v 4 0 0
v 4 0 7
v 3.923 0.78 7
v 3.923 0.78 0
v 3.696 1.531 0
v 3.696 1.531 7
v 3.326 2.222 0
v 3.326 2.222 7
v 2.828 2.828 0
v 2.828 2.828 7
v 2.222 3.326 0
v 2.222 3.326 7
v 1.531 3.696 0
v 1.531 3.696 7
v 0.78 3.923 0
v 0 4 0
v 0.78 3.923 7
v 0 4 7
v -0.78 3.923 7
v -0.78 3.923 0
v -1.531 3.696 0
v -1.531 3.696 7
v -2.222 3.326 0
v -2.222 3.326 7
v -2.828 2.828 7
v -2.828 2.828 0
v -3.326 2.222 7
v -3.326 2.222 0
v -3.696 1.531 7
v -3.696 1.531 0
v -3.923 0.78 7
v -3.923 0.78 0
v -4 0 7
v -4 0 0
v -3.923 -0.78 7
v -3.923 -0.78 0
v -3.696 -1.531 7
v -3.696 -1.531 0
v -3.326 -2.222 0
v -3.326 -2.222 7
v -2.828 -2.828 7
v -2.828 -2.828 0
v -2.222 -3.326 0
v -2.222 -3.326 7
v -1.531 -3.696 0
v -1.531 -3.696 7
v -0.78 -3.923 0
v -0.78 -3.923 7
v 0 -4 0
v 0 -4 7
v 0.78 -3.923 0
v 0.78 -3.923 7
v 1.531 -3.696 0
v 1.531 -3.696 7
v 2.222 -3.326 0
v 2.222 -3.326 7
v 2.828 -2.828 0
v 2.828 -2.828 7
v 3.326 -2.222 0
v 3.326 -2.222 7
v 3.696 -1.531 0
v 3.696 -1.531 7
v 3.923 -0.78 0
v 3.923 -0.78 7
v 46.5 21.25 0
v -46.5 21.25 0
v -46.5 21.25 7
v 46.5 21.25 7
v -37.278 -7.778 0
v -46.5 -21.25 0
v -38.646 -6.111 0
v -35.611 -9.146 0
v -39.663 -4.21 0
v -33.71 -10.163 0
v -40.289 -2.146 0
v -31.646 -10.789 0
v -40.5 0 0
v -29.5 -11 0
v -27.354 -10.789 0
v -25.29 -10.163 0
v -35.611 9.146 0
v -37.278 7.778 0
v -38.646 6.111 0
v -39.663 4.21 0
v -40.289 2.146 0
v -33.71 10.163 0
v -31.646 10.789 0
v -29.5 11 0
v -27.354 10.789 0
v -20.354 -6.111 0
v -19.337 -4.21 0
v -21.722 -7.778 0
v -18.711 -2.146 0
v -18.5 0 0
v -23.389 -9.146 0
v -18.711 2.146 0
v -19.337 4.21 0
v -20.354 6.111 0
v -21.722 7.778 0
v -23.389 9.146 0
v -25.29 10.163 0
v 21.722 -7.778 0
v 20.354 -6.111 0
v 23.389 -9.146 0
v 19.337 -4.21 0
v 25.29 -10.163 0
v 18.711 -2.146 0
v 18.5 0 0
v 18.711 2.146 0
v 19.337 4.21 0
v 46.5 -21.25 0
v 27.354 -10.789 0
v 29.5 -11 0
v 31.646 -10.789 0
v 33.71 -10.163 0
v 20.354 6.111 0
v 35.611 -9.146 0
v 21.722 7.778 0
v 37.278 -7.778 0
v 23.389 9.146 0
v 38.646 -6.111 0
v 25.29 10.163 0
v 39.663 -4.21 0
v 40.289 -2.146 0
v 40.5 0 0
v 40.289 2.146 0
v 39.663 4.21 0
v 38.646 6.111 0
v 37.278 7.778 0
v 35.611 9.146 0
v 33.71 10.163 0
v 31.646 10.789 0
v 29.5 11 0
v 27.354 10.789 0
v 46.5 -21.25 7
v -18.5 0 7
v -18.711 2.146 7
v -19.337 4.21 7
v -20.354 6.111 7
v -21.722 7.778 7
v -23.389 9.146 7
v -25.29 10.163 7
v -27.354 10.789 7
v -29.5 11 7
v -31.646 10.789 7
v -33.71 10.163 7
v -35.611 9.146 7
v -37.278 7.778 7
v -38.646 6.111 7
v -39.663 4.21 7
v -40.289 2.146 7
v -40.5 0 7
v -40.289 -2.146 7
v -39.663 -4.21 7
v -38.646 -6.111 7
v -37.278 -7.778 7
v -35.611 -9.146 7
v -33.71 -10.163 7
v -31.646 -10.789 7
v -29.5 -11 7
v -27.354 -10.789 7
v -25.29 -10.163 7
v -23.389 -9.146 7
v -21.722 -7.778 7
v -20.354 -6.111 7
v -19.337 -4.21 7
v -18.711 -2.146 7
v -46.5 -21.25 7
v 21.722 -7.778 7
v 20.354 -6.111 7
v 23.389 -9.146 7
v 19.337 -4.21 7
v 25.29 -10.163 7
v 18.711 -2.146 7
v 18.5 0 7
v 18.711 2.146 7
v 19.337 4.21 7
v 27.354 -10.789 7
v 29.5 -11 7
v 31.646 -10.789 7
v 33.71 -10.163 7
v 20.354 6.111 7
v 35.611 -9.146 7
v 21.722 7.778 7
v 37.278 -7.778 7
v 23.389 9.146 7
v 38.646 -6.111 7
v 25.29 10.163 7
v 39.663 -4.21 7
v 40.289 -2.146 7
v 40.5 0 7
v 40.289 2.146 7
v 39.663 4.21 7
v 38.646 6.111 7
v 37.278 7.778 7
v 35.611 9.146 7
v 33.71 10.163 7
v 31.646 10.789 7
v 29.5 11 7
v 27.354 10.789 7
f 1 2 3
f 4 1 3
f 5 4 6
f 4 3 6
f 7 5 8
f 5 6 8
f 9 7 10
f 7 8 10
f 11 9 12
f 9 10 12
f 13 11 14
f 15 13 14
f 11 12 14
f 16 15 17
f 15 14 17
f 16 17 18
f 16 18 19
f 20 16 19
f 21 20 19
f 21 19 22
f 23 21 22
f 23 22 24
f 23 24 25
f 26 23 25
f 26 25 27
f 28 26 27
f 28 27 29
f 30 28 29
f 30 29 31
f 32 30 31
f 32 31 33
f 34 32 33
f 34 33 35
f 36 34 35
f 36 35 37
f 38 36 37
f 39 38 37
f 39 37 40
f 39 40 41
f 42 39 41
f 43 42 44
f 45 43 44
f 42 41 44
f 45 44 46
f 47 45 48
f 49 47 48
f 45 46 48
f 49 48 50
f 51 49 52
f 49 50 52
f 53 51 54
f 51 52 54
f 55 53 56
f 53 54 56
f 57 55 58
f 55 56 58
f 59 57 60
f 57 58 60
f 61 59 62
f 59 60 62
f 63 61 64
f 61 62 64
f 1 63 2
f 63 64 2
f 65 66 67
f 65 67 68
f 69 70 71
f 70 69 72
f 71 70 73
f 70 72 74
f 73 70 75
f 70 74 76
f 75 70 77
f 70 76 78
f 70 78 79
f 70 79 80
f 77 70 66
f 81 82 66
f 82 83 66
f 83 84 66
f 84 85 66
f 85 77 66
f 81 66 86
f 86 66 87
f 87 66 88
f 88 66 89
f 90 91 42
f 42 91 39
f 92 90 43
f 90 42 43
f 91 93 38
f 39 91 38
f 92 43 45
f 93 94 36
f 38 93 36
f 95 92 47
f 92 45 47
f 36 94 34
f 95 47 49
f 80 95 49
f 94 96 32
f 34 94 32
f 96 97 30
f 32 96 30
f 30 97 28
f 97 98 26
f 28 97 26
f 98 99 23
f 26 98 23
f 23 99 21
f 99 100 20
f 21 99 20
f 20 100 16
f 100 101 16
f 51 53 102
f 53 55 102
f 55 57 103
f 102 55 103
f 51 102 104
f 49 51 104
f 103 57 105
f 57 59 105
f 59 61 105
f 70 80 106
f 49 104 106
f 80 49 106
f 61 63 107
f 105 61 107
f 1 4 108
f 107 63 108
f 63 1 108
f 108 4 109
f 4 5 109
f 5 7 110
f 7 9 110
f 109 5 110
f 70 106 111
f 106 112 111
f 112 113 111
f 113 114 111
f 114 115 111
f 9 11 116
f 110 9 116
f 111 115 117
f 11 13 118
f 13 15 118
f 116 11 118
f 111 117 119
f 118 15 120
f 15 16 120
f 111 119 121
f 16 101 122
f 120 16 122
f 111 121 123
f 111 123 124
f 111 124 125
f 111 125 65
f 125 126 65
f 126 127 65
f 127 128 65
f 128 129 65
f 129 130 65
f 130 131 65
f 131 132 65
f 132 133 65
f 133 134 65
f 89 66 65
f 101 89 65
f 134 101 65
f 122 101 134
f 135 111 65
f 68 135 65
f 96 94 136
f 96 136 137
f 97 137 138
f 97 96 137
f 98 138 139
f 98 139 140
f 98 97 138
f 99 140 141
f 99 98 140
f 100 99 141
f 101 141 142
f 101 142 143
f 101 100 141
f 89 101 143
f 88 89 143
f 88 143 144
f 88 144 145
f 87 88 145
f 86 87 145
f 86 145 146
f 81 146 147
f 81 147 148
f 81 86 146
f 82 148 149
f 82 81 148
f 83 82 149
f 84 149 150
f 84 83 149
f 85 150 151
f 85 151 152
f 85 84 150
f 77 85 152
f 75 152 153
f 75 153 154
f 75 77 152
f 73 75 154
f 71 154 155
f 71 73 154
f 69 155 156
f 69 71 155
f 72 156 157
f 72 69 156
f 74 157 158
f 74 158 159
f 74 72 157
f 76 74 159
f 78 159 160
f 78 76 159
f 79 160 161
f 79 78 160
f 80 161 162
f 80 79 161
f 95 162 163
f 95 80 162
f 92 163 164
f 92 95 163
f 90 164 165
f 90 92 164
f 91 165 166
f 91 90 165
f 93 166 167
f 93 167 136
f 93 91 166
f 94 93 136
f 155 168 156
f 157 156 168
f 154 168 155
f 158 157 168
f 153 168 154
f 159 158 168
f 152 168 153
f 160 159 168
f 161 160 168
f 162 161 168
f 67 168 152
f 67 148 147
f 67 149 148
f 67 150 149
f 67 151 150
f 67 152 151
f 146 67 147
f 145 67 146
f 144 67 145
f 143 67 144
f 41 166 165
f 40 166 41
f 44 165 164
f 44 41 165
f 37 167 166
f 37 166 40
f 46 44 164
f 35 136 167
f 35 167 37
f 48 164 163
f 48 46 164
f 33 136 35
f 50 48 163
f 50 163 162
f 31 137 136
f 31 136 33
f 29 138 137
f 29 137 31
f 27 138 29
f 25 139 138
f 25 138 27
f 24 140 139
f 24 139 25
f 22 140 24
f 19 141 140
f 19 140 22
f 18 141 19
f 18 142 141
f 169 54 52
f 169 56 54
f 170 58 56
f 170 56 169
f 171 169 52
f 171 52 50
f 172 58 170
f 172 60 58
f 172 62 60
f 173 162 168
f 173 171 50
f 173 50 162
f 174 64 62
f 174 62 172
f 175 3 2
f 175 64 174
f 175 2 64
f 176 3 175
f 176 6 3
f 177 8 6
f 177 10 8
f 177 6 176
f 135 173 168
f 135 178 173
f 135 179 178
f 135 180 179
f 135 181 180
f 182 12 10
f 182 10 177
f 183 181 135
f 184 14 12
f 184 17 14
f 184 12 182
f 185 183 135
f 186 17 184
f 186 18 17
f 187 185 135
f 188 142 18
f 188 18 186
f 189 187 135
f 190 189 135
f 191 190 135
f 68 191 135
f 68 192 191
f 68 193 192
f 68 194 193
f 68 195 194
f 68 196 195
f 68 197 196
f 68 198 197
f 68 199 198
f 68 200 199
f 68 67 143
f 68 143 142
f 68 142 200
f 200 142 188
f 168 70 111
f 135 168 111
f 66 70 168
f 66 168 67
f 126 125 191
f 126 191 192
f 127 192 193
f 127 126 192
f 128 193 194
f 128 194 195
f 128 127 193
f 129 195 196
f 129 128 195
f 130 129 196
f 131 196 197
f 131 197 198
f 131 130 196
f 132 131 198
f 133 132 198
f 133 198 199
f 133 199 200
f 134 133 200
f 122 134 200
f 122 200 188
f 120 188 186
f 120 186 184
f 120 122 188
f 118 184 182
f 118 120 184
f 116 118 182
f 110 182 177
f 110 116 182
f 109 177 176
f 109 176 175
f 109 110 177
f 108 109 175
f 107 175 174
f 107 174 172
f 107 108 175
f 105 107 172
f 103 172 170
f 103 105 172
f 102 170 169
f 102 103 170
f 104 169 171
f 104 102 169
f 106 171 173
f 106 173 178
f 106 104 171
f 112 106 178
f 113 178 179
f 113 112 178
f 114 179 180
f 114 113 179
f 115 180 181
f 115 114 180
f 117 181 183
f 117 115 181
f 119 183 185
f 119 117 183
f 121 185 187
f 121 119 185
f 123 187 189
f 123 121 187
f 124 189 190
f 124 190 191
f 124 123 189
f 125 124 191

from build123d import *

# Parameters (mm, degrees)
SKETCH_W     = 93
SKETCH_H     = 42.5
SKETCH_R     = 11
PAD_DEPTH    = 7
SKETCH001_R  = 4
POCKET_DEPTH = 7.001


with BuildPart() as part:
    # Sketch → Pad (new body)
    with BuildSketch(Plane.XY):
        Rectangle(SKETCH_W, SKETCH_H)
        with Locations((29.5, 0)):
            Circle(SKETCH_R, mode=Mode.SUBTRACT)
        with Locations((-29.5, 0)):
            Circle(SKETCH_R, mode=Mode.SUBTRACT)
    extrude(amount=PAD_DEPTH)

    # Sketch001 → Pocket (cut, through all)
    with BuildSketch(Plane.XY.offset(7)):
        Circle(SKETCH001_R)
    extrude(amount=-POCKET_DEPTH, mode=Mode.SUBTRACT)


solid = part.part
